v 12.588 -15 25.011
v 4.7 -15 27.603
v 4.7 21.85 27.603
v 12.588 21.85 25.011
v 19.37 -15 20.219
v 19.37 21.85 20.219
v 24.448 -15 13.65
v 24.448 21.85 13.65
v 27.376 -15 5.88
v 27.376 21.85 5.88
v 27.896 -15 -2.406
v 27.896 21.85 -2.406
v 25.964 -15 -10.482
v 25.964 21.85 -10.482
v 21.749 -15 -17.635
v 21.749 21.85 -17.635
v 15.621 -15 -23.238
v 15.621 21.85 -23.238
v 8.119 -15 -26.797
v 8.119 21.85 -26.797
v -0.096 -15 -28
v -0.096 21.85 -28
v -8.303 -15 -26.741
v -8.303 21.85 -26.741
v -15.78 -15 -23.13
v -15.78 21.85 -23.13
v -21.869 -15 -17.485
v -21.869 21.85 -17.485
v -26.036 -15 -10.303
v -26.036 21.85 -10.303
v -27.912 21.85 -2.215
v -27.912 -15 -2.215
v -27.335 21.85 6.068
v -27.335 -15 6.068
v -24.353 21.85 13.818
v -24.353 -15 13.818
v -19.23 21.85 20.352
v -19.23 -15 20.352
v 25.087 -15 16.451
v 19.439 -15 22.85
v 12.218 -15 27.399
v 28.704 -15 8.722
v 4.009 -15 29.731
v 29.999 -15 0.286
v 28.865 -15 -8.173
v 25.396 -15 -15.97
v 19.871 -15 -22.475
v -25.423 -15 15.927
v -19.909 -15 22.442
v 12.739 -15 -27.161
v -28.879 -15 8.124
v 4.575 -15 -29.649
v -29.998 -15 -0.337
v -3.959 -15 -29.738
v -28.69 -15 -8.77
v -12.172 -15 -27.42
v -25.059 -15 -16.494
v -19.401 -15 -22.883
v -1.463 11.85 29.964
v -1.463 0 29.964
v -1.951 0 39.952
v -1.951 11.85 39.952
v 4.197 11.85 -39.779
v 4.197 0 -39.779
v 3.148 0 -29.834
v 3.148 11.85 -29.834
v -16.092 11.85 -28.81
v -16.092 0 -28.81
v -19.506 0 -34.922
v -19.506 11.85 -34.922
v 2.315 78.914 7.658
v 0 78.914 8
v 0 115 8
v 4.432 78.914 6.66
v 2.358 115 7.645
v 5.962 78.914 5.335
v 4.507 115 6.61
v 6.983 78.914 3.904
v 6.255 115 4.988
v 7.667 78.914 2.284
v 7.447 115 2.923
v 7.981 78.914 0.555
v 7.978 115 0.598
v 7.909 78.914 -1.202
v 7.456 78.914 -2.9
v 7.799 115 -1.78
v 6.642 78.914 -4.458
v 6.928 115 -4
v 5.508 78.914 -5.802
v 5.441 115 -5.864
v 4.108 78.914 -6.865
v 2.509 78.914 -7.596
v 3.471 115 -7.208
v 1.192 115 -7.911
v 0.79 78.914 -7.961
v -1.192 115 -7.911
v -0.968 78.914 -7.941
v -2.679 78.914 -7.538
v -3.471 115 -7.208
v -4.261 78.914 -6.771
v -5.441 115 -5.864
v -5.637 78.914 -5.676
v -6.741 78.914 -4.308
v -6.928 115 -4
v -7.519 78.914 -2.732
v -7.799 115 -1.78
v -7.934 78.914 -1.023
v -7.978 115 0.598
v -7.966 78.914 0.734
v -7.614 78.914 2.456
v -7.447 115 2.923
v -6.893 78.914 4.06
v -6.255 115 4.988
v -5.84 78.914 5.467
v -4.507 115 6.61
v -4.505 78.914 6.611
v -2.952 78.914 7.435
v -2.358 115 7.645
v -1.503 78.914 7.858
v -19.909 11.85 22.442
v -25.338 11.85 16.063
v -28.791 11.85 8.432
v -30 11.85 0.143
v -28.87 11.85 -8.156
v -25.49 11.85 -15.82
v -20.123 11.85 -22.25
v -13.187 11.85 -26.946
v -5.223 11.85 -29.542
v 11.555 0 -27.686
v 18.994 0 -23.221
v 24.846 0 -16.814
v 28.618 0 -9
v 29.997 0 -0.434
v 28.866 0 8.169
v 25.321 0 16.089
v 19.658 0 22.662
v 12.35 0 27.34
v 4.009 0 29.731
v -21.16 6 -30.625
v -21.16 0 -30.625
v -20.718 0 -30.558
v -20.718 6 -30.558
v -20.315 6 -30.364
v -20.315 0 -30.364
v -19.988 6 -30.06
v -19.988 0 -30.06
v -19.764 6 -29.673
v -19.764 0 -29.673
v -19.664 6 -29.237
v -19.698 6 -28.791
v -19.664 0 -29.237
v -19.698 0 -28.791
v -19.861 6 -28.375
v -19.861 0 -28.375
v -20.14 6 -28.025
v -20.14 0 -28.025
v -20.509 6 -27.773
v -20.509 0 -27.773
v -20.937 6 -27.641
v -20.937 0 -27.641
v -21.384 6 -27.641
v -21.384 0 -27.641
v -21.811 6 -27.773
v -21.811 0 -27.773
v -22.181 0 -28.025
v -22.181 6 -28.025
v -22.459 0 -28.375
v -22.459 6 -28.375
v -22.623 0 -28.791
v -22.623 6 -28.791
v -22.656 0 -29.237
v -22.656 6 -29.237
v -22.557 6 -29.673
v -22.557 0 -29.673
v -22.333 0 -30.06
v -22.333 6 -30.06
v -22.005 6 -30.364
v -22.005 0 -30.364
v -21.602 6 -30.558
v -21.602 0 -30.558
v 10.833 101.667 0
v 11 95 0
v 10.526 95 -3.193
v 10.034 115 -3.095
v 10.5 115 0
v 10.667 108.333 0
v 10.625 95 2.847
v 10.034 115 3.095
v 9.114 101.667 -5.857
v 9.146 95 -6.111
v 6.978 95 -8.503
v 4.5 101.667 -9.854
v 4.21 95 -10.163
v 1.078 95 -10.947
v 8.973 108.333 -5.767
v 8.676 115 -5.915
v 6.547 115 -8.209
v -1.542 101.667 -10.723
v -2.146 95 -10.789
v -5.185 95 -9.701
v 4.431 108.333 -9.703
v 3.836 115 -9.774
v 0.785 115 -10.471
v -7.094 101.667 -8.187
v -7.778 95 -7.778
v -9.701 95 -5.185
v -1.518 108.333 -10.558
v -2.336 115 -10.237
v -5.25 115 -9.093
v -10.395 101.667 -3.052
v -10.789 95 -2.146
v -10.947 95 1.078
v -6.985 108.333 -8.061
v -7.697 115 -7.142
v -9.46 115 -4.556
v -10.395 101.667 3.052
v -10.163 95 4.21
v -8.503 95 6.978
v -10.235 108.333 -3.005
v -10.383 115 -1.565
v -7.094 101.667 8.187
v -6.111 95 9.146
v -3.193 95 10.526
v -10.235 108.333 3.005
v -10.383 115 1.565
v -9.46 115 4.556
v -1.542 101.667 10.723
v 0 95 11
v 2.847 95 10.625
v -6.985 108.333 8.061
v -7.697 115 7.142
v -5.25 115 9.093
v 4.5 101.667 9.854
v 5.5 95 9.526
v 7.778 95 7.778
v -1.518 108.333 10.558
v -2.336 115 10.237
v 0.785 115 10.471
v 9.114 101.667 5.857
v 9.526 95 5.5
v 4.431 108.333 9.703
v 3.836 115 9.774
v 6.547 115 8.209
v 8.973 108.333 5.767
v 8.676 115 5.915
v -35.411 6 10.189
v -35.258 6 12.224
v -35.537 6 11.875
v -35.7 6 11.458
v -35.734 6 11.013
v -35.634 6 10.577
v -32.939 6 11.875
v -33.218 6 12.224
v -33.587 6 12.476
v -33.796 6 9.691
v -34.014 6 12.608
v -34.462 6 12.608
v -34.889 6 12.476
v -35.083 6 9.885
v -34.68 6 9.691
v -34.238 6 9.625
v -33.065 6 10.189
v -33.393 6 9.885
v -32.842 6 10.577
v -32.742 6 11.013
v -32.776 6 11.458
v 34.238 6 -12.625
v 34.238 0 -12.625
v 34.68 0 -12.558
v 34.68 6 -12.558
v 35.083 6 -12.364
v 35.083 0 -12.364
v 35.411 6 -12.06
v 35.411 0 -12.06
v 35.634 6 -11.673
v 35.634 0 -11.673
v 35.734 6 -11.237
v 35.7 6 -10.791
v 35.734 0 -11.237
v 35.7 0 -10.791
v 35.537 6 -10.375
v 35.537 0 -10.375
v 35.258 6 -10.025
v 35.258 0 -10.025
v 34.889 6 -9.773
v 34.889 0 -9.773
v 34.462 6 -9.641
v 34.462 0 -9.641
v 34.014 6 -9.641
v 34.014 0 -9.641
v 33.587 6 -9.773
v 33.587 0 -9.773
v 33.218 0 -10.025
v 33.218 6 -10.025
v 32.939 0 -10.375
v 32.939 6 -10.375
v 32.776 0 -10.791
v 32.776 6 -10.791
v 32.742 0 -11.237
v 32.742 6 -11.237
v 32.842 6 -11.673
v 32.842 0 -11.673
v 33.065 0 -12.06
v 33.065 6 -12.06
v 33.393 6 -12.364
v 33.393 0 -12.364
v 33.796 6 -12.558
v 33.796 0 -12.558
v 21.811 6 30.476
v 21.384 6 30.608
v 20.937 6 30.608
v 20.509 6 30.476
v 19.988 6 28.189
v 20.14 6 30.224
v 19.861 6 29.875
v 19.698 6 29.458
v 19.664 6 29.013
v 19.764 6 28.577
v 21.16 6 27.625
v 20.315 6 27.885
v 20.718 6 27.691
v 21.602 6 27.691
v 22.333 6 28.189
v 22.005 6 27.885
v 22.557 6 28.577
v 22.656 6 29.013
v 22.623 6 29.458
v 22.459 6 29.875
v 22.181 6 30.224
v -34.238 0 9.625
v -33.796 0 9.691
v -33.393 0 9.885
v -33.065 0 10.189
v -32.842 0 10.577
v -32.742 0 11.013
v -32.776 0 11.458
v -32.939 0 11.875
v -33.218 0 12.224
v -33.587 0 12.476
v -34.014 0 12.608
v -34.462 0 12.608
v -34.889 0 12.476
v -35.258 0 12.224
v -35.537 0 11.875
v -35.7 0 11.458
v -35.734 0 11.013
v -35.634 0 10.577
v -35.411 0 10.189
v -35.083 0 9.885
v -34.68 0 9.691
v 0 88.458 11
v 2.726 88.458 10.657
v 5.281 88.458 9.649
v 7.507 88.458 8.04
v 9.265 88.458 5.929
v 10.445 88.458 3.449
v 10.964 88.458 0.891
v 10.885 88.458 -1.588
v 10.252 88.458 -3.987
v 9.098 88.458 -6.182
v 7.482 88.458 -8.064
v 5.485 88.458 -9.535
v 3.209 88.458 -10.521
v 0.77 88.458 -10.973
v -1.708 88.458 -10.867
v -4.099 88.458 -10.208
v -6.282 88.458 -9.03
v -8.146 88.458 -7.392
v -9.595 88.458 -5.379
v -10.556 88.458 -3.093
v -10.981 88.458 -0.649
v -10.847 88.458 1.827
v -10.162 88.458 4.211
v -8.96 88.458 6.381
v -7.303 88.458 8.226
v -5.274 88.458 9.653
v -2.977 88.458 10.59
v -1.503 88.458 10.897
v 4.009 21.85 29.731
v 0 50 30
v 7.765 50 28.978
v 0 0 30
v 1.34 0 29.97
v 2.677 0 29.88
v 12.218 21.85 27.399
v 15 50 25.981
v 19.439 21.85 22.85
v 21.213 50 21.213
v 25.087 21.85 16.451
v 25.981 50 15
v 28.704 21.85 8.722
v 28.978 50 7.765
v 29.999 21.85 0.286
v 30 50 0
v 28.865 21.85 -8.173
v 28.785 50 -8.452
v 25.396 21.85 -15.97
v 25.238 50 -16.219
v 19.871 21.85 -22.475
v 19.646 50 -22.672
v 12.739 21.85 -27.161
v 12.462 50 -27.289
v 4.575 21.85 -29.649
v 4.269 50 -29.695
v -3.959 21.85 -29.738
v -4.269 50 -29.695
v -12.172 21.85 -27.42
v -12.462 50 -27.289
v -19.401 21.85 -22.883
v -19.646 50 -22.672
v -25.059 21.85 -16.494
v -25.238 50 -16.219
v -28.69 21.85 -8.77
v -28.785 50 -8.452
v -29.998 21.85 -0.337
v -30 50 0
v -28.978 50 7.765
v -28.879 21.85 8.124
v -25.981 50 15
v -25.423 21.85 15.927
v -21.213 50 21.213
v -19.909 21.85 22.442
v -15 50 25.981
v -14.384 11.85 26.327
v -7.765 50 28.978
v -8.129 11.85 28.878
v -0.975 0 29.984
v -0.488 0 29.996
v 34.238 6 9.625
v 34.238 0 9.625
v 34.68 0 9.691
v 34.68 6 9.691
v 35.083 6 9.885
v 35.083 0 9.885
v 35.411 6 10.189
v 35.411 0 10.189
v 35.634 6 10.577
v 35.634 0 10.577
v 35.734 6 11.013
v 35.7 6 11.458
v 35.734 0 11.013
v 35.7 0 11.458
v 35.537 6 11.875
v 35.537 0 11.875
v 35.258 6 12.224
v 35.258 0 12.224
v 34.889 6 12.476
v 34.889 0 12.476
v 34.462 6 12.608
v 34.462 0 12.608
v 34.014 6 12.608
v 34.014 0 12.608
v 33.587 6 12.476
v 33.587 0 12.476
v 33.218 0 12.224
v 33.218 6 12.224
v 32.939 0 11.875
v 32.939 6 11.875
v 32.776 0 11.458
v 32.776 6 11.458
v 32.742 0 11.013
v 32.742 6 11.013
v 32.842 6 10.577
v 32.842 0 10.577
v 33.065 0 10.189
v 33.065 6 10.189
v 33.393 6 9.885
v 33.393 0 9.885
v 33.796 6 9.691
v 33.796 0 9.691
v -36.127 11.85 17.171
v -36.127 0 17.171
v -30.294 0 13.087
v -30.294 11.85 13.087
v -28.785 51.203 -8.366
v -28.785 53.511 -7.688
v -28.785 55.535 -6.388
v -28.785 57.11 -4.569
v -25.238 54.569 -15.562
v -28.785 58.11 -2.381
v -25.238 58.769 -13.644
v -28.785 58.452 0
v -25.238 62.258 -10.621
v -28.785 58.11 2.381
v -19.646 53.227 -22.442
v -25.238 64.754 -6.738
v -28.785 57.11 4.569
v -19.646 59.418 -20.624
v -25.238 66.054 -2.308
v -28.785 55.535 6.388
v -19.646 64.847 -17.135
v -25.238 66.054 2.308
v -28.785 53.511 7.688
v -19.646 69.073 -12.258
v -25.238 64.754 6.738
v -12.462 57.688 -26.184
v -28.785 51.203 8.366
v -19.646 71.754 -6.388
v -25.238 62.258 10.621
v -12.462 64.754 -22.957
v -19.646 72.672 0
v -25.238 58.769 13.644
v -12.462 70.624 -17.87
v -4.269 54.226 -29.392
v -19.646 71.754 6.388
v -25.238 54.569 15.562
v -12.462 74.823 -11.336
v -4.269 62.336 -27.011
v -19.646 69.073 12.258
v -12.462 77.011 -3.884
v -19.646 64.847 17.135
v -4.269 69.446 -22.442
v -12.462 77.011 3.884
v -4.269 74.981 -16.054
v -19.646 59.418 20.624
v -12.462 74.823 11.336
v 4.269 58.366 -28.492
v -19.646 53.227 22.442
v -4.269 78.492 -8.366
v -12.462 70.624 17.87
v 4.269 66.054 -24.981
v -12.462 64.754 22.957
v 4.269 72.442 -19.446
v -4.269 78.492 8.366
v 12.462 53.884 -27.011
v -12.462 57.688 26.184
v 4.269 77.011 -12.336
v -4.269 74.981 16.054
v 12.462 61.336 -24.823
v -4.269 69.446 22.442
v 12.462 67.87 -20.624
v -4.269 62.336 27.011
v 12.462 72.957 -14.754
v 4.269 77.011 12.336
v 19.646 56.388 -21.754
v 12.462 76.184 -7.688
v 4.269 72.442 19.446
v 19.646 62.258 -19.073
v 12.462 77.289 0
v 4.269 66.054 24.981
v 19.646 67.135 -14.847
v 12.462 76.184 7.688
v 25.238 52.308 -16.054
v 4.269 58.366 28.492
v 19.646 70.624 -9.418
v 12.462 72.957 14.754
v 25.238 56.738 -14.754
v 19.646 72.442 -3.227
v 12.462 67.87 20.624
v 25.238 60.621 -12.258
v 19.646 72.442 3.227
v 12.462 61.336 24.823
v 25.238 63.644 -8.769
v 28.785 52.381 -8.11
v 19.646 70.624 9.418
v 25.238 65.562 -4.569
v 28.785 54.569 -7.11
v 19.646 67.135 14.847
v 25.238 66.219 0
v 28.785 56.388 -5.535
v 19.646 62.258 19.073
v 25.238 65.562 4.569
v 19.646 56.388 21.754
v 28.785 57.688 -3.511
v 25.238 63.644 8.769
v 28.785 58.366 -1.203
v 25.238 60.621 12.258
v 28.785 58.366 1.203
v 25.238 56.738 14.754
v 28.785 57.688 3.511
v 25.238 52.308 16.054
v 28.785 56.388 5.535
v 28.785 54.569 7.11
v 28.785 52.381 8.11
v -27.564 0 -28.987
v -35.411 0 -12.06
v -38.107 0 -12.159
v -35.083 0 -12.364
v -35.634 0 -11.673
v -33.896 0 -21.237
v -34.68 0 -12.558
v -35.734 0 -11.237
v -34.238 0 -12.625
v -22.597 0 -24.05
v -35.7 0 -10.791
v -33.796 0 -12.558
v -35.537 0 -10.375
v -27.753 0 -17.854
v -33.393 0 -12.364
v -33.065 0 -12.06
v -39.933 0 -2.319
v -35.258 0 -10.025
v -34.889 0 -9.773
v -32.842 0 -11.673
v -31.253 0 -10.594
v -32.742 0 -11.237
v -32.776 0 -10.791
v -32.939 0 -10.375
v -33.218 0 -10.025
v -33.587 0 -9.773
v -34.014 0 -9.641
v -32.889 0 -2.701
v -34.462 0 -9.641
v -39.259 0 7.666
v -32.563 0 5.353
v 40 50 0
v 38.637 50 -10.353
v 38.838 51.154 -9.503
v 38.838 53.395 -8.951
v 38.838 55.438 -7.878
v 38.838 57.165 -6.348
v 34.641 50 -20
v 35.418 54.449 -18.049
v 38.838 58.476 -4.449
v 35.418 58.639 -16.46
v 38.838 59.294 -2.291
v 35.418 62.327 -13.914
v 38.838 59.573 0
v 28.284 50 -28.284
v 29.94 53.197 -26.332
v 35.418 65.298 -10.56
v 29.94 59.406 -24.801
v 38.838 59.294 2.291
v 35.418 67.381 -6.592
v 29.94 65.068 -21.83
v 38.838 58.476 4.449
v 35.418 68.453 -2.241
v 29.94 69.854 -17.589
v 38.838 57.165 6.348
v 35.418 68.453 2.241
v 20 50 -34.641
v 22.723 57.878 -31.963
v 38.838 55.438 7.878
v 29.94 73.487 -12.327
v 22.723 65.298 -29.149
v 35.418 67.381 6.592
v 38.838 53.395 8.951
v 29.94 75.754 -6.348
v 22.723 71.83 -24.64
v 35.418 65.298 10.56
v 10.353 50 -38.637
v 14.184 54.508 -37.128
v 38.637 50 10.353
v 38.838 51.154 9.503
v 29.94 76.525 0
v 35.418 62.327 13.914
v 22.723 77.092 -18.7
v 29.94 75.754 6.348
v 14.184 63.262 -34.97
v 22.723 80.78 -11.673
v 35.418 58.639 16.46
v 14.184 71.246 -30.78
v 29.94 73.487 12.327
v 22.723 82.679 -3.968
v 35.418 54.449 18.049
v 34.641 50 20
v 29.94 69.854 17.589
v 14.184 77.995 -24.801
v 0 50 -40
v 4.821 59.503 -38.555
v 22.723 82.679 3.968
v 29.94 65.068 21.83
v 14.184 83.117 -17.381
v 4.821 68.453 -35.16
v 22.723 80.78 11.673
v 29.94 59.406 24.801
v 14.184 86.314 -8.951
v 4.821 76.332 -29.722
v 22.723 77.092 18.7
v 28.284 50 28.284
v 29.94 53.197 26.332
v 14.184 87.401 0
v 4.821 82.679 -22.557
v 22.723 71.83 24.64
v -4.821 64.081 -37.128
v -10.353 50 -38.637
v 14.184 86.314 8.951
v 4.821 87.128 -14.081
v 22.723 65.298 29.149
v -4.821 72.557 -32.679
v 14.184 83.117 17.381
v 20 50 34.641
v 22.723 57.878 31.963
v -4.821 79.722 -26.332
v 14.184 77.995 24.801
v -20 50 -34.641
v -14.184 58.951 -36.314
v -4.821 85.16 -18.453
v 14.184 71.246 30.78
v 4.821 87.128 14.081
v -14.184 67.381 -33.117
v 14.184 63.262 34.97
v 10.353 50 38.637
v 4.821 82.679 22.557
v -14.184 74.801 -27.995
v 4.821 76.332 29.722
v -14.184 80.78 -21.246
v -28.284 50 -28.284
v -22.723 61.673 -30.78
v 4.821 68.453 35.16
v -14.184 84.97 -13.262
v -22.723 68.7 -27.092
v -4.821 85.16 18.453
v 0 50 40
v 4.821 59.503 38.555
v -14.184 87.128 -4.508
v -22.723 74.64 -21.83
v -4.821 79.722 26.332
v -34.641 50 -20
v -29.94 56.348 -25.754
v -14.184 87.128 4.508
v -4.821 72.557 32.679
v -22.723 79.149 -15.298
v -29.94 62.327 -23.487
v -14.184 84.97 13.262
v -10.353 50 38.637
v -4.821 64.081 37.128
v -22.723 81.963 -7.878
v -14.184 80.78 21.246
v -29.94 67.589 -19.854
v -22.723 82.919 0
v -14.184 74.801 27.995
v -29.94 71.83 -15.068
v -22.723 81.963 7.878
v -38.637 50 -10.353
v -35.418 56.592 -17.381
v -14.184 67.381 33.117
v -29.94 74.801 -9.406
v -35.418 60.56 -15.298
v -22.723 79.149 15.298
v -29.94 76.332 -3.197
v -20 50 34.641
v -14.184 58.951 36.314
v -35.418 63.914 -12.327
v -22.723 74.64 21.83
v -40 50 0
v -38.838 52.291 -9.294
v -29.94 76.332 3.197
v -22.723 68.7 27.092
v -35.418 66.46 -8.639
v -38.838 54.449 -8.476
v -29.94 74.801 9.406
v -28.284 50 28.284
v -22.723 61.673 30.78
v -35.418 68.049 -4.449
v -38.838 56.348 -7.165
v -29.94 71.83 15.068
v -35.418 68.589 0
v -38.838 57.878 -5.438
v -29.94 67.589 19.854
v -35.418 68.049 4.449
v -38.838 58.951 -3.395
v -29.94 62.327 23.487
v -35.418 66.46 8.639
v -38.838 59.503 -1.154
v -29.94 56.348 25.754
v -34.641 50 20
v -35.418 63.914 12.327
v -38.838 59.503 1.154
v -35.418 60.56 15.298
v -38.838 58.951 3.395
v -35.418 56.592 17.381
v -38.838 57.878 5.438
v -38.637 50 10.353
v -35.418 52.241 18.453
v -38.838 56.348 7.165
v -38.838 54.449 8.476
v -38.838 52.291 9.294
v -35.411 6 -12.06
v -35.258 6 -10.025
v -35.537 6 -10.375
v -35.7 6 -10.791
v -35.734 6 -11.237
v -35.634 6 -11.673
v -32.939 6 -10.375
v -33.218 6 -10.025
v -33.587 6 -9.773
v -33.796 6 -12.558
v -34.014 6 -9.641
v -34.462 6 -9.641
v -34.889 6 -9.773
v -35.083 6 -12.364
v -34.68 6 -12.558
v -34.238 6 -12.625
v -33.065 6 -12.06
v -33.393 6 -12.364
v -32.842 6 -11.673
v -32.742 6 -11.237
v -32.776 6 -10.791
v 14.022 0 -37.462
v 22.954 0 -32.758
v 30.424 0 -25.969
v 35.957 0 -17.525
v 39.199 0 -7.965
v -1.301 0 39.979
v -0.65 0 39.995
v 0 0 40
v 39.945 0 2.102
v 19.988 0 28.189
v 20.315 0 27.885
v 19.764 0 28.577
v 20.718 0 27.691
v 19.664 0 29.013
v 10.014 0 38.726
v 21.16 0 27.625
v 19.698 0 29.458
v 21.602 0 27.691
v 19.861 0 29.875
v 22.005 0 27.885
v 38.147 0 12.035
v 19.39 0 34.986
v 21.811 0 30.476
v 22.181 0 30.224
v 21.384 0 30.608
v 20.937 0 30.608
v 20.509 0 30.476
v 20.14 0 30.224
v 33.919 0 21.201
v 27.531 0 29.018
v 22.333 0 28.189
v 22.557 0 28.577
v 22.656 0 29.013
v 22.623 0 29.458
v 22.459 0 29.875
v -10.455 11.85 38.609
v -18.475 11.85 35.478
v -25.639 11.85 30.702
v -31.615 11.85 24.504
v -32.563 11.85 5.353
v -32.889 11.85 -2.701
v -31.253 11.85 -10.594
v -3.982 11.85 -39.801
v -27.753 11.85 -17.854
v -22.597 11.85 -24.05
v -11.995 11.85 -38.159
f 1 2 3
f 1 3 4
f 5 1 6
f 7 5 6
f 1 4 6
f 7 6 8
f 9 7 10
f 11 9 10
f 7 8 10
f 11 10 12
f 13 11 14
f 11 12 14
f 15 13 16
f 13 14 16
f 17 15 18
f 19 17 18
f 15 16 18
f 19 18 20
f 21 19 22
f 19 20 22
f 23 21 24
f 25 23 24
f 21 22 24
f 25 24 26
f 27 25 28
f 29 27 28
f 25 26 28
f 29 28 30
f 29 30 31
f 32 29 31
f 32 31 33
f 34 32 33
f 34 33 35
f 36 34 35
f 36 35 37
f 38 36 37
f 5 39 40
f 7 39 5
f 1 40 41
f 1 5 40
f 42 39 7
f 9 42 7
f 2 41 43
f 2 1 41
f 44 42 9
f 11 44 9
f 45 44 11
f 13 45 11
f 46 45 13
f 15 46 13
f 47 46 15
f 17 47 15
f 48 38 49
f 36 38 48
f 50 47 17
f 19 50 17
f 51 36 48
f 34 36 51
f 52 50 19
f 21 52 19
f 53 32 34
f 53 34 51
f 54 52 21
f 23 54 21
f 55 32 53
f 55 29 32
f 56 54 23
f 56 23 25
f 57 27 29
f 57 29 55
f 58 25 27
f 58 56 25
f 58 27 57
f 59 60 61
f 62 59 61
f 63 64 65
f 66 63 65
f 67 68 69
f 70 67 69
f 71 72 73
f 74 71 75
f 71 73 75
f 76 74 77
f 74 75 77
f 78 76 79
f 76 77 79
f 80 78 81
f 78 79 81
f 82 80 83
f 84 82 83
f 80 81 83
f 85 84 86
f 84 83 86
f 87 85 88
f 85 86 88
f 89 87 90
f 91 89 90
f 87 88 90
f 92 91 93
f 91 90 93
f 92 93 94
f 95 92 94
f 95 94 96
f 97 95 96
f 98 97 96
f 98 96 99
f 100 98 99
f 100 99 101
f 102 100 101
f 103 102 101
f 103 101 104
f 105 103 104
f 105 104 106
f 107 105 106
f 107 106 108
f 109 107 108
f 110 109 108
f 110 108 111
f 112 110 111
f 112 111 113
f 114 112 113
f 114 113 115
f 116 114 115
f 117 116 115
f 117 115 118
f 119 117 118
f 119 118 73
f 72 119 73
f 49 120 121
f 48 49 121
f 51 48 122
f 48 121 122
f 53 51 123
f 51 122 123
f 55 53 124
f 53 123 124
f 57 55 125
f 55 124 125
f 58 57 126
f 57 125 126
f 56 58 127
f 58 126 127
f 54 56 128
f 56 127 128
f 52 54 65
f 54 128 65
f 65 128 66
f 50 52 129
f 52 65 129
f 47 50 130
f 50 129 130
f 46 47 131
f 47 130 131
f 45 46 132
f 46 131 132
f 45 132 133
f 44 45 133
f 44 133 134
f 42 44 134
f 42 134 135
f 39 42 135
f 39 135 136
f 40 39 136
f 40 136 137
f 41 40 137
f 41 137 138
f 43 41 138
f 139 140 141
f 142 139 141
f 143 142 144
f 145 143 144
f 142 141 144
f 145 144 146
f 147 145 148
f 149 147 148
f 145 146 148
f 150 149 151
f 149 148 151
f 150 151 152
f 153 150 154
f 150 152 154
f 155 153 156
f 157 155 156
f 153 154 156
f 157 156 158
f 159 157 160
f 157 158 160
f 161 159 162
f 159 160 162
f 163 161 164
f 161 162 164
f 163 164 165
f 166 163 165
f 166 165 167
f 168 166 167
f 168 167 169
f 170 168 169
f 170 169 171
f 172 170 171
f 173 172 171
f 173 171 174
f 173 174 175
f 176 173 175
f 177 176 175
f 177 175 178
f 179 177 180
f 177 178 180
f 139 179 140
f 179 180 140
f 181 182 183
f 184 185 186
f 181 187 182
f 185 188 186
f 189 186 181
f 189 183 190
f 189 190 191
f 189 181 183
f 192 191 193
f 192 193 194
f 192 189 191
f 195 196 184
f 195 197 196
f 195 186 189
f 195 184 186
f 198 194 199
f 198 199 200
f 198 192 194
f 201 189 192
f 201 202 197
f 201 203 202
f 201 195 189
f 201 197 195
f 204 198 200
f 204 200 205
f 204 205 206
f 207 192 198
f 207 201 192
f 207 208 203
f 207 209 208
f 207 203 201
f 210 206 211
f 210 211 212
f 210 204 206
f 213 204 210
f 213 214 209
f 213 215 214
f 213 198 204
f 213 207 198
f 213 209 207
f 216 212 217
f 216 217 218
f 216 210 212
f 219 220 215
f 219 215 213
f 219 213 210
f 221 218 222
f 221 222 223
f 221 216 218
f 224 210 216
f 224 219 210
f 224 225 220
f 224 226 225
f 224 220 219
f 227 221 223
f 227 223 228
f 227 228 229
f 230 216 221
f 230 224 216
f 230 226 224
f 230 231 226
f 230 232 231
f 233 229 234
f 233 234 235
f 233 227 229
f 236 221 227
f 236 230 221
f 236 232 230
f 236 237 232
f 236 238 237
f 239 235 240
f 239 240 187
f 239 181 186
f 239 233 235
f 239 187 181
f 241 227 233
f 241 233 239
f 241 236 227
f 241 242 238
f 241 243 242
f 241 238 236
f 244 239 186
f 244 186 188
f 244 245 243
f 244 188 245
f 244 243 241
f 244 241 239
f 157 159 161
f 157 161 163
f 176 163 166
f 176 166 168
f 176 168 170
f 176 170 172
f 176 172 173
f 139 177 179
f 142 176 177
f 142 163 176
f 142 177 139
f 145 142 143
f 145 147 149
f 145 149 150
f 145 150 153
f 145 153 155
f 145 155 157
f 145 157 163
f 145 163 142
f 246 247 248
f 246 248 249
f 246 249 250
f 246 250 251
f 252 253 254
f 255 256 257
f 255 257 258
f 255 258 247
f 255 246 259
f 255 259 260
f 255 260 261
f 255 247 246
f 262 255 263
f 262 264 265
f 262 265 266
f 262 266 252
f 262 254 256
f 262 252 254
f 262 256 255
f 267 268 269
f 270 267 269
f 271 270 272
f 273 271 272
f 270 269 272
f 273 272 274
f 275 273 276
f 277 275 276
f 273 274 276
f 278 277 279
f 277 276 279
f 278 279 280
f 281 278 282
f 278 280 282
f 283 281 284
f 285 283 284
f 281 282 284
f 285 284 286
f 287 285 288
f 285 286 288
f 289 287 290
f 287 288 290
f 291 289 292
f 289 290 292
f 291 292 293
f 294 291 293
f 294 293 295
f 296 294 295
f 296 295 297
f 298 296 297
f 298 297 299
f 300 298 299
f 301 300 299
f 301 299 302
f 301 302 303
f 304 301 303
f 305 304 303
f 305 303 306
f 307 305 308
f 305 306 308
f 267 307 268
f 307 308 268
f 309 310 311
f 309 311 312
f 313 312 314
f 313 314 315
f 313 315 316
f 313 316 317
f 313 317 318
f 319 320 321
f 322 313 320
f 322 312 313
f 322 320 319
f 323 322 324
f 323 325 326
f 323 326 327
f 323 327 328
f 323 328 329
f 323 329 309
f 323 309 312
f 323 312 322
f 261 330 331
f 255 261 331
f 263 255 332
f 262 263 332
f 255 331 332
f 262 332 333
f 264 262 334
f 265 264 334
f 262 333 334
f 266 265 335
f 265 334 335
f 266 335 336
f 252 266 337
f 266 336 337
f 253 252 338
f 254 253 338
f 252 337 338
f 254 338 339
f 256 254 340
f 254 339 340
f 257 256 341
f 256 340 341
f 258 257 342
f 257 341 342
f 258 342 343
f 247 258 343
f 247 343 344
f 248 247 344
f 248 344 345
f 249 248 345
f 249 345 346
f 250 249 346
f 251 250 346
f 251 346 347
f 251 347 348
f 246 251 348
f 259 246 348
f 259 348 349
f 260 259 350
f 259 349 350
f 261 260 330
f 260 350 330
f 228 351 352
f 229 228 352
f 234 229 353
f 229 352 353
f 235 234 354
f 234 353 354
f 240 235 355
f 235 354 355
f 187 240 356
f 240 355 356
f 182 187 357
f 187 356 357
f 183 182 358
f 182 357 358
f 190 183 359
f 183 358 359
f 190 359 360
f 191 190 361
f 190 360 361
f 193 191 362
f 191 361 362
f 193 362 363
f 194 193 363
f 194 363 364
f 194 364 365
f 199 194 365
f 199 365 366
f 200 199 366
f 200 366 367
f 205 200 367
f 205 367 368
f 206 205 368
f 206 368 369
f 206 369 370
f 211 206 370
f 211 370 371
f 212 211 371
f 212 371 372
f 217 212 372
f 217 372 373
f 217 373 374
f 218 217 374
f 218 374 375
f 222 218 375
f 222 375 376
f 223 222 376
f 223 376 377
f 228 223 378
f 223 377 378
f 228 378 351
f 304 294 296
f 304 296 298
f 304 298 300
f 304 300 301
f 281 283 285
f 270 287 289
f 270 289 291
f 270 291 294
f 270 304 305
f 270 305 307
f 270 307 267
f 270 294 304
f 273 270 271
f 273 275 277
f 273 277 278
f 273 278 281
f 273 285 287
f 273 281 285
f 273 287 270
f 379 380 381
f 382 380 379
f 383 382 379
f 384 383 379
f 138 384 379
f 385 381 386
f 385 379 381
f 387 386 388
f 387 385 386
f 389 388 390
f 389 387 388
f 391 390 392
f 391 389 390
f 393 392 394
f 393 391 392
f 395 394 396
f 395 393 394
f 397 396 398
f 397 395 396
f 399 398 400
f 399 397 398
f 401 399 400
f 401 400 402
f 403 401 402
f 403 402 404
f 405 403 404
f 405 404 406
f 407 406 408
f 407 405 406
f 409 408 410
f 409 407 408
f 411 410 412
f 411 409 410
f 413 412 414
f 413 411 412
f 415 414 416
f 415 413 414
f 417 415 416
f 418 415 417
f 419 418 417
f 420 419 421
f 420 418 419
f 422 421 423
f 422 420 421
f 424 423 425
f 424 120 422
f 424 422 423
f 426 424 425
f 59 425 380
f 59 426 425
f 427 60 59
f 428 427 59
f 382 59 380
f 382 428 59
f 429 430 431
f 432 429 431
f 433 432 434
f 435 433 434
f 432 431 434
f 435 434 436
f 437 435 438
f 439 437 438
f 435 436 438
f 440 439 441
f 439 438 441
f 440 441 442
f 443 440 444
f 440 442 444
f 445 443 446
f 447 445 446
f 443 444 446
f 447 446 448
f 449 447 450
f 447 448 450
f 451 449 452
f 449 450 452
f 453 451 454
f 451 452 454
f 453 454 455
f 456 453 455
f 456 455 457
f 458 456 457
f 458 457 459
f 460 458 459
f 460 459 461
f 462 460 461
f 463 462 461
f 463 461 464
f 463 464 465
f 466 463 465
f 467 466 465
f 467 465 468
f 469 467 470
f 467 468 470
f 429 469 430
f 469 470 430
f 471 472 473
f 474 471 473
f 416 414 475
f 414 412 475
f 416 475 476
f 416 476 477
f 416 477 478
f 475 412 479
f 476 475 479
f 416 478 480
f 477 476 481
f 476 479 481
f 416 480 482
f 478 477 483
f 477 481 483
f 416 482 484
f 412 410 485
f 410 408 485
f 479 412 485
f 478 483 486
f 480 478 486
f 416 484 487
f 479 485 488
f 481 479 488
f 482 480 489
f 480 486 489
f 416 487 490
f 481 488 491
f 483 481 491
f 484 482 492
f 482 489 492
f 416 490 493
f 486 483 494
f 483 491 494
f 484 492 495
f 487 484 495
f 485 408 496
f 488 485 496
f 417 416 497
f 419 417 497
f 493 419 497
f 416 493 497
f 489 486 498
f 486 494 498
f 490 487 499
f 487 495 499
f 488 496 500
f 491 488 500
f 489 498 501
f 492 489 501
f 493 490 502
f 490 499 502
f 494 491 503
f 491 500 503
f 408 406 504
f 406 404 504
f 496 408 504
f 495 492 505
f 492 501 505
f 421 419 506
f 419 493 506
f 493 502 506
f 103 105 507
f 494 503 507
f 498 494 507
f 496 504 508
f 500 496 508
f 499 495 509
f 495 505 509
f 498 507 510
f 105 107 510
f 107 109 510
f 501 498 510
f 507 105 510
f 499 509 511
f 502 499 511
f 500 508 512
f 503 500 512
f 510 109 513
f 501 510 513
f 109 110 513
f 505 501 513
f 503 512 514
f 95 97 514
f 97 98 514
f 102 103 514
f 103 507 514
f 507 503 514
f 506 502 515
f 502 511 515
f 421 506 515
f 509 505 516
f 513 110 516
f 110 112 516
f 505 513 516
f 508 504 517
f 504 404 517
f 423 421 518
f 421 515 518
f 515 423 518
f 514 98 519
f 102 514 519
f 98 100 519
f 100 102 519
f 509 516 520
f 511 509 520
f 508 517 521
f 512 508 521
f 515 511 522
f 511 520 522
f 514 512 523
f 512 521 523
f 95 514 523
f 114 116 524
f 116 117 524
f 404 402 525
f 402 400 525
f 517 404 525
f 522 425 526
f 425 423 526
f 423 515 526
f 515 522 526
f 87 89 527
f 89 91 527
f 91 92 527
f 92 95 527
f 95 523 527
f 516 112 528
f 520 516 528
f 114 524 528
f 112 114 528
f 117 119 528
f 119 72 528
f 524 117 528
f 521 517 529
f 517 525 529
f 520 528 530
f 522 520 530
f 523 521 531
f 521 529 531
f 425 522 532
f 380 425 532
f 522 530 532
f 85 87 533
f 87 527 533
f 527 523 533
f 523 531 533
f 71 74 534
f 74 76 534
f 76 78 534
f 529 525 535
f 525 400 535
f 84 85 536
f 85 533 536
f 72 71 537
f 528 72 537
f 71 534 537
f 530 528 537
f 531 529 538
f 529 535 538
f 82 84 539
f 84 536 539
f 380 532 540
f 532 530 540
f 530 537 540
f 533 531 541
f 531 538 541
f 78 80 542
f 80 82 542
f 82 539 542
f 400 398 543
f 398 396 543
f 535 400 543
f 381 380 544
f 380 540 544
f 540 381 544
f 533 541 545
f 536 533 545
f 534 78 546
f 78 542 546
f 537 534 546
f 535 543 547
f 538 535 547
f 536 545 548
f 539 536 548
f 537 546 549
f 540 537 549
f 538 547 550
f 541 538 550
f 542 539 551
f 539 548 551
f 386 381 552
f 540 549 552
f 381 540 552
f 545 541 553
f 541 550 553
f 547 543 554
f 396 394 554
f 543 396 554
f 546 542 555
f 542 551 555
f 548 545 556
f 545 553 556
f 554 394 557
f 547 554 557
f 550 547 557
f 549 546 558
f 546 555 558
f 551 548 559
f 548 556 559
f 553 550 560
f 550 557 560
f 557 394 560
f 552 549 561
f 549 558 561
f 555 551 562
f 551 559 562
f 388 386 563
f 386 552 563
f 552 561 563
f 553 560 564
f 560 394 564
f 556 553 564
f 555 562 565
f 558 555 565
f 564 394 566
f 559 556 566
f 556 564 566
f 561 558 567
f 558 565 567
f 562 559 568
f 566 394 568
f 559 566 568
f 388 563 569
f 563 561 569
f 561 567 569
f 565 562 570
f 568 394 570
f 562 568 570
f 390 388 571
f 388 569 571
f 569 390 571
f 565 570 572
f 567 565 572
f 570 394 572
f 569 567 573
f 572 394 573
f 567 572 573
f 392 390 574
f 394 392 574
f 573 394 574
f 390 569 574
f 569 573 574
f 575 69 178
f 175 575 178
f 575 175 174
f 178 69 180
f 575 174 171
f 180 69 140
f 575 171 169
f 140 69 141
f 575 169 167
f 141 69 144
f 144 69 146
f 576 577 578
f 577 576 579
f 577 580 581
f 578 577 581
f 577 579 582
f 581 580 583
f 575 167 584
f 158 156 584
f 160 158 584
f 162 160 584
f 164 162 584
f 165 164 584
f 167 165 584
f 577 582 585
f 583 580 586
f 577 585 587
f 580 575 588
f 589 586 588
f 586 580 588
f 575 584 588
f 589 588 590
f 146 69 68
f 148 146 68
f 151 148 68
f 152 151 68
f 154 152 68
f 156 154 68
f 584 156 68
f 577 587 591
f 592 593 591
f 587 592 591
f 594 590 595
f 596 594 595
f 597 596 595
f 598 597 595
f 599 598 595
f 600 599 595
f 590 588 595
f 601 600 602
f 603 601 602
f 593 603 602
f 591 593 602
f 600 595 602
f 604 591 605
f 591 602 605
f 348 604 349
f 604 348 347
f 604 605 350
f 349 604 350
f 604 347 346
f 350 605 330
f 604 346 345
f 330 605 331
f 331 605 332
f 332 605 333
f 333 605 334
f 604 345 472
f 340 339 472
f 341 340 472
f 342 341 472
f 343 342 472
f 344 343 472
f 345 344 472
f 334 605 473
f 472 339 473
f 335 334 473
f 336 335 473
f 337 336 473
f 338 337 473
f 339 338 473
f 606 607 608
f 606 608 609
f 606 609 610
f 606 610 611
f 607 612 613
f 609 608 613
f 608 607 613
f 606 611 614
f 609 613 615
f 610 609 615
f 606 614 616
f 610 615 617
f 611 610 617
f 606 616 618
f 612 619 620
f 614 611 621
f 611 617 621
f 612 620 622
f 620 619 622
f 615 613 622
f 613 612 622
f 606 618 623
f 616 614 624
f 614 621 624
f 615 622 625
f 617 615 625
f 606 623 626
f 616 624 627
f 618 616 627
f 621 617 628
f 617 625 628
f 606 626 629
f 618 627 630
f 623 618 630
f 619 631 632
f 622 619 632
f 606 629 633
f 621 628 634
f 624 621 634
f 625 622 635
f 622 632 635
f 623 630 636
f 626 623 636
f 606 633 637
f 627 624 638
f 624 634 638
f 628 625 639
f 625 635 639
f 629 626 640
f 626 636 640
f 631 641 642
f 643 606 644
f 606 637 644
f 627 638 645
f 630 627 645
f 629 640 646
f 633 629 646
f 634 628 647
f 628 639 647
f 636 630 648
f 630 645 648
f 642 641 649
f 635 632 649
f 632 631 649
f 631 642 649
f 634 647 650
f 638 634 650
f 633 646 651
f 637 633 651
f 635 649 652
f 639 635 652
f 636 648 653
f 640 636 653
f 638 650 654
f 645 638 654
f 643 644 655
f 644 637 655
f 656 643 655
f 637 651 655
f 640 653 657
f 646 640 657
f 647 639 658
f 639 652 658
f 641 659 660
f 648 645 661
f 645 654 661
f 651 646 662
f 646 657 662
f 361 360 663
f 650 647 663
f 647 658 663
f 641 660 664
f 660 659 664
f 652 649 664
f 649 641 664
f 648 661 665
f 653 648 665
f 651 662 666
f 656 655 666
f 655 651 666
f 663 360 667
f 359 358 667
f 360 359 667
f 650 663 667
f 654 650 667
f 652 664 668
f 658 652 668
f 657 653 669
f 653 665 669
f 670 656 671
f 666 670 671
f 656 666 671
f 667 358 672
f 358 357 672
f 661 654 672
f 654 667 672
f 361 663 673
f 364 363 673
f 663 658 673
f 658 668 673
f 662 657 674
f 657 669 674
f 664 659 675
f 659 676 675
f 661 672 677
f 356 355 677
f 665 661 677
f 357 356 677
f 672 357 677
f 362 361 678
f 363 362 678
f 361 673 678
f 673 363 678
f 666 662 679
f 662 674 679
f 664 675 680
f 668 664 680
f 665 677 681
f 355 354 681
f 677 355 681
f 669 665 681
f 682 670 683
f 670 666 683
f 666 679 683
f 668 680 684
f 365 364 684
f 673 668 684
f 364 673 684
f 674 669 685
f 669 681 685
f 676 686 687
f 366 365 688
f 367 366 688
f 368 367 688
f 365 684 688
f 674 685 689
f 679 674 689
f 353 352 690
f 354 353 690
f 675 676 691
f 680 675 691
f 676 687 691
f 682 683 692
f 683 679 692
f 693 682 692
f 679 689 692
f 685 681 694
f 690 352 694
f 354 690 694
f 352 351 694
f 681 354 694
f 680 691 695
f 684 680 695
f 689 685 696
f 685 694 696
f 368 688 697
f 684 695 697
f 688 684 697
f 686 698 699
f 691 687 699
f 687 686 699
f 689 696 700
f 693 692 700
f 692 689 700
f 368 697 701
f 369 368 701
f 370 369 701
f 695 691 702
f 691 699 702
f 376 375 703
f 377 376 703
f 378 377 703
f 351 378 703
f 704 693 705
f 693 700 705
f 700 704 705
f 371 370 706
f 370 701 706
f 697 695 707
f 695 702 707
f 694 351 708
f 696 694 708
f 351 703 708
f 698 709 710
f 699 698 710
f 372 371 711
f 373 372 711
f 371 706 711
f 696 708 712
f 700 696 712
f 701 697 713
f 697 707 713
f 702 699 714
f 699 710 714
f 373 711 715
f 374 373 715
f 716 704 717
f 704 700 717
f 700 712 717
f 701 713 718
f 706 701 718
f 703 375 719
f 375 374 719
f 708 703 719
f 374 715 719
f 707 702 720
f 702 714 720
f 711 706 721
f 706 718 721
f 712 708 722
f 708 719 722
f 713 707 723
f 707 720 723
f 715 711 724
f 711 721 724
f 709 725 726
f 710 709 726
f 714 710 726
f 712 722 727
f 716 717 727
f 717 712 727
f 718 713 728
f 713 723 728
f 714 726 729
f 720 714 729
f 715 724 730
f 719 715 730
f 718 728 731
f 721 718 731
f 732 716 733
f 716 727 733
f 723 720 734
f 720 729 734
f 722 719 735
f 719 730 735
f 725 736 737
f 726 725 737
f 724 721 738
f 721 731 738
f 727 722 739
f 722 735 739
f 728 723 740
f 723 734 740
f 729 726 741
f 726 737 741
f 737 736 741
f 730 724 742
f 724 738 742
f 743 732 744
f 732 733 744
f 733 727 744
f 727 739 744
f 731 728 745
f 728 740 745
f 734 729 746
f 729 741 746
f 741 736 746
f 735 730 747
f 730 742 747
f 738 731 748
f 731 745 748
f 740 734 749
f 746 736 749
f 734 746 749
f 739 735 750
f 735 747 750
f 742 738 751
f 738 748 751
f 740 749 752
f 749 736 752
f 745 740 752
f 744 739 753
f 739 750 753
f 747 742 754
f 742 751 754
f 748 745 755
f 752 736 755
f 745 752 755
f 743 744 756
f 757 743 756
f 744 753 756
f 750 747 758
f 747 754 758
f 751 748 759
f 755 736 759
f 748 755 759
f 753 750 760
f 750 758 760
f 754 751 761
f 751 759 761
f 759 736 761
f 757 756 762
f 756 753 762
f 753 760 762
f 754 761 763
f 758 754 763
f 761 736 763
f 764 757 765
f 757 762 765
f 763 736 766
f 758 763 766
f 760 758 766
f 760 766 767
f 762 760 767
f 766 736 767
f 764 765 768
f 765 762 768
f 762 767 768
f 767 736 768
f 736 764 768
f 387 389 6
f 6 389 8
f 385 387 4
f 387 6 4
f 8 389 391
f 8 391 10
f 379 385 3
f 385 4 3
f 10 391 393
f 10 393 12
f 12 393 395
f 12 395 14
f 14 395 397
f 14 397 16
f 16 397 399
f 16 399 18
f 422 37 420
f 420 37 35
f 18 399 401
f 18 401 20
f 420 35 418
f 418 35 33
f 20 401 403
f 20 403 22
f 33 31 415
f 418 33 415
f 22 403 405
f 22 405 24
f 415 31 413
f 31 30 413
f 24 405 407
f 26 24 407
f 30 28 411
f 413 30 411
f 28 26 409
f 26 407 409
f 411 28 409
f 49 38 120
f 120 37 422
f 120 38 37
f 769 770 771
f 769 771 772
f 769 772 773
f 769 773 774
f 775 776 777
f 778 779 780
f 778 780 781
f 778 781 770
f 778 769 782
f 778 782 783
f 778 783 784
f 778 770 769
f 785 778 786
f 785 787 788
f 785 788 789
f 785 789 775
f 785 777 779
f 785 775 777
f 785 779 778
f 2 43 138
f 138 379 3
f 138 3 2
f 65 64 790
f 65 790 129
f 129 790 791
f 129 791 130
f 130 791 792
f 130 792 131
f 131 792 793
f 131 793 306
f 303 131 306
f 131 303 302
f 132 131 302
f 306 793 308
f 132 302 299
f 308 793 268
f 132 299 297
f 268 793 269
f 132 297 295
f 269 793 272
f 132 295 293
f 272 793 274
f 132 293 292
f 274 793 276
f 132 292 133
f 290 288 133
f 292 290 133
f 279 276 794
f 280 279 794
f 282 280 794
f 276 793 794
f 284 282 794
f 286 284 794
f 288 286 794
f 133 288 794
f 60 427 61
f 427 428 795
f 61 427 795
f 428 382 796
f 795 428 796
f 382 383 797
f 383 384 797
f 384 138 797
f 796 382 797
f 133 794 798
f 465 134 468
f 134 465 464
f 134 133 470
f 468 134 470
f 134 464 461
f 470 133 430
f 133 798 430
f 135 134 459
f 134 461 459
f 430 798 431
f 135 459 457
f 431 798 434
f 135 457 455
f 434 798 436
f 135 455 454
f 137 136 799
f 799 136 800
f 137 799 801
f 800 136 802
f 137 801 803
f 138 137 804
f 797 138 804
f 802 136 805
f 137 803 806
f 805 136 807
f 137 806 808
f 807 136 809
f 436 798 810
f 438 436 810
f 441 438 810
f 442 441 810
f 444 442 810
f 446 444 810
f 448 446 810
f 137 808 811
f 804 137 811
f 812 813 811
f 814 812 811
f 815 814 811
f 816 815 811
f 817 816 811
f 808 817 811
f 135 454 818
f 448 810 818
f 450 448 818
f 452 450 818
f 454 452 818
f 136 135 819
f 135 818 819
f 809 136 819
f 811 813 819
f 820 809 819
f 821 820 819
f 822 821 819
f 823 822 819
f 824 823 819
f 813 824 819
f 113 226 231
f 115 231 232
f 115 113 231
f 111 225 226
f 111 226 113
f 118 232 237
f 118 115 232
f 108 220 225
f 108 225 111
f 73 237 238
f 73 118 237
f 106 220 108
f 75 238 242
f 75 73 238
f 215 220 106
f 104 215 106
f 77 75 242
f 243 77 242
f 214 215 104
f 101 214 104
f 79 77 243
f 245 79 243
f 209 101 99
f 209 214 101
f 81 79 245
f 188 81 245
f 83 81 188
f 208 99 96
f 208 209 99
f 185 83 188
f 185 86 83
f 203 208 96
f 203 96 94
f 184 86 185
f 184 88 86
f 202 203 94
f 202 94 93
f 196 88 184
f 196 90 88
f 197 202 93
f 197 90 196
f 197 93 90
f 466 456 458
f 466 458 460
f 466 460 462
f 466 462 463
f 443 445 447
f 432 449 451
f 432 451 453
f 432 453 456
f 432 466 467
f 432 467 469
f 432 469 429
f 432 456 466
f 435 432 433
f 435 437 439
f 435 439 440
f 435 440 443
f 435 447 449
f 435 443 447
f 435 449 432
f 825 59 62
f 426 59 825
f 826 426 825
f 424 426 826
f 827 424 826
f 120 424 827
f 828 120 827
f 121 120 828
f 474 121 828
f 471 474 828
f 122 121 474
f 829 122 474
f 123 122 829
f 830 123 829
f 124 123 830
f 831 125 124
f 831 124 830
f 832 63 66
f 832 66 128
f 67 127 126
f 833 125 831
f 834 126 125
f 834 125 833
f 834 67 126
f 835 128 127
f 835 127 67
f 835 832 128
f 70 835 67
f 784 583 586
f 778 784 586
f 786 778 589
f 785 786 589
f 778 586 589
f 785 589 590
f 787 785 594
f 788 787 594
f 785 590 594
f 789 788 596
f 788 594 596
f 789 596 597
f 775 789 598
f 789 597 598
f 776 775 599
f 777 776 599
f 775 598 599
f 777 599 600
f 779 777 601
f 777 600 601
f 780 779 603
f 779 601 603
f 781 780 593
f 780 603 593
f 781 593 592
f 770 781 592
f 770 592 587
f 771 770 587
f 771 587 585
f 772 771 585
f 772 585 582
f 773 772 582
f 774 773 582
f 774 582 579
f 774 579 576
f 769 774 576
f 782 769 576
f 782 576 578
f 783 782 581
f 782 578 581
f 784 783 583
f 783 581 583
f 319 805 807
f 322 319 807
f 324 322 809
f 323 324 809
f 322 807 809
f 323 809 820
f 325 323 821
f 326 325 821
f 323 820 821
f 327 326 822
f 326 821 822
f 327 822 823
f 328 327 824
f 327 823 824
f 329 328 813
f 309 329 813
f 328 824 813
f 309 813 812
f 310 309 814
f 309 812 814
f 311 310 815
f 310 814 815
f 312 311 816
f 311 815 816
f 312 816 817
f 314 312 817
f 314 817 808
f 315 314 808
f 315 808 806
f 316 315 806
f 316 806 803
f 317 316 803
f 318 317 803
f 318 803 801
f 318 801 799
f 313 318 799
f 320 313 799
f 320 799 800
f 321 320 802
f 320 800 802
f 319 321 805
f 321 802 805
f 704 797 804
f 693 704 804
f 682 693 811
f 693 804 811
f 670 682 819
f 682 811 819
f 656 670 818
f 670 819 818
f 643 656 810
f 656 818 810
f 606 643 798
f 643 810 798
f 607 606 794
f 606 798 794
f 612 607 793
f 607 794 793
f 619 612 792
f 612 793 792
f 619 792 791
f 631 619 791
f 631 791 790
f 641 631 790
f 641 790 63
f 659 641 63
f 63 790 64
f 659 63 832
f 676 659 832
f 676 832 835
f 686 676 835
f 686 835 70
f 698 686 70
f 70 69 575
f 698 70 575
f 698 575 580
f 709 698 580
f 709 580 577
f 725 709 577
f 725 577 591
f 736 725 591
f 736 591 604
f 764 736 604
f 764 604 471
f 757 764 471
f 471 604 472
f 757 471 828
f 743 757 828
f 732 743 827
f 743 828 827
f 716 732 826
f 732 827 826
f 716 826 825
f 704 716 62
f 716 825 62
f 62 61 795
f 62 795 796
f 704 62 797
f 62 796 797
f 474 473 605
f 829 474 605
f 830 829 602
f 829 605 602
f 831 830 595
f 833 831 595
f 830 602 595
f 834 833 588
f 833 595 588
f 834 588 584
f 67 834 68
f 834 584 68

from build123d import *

# Parameters (mm, degrees)
ESBO_O1_R                     = 40
ESBO_O1_R_2                   = 30
RESSALTO_EXTRUS_O1_DEPTH      = 50
ESBO_O2_R                     = 1.5
CORTE_EXTRUS_O1_DEPTH         = 6
CORTE_EXTRUS_O2_DEPTH         = 11.84997677
RESSALTO_EXTRUS_O2_DEPTH      = 26.84997677
RESSALTO_EXTRUS_O2_DEPTH_BACK = 10
REVOLU_O1_ANGLE               = 180
RESSALTO_EXTRUS_O5_DEPTH      = 5
RESSALTO_EXTRUS_O5_DEPTH_BACK = 2
ESBO_O10_R                    = 11
ESBO_O13_R                    = 8
CORTE_EXTRUS_O4_DEPTH         = 40


# Read off the part's stored shape, not the designer's step: Limites1
with BuildPart() as part:
    # Esboço1 → Ressalto-extrusão1 (new body)
    with BuildSketch(Plane(origin=(0, 0, 0), x_dir=(1, 0, 0), z_dir=(0, 1, 0))):
        with Locations(Location((0, 0, 0), (0, 0, 270))):
            Circle(ESBO_O1_R)
        with Locations(Location((0, 0, 0), (0, 0, 270))):
            Circle(ESBO_O1_R_2, mode=Mode.SUBTRACT)
    extrude(amount=RESSALTO_EXTRUS_O1_DEPTH)

    # Esboço2 → Corte-extrusão1 (cut)
    with BuildSketch(Plane(origin=(0, 0, 0), x_dir=(-1, 0, 0), z_dir=(0, -1, 0))):
        with Locations(Location((-21.160269083, -29.124611797, 0), (0, 0, 90))):
            Circle(ESBO_O2_R)
        with Locations(Location((-34.238034587, -11.124611797, 0), (0, 0, 90))):
            Circle(ESBO_O2_R)
        with Locations(Location((-34.238034587, 11.124611797, 0), (0, 0, 90))):
            Circle(ESBO_O2_R)
        with Locations(Location((21.160269083, 29.124611797, 0), (0, 0, 90))):
            Circle(ESBO_O2_R)
        with Locations(Location((34.238034587, 11.124611797, 0), (0, 0, 90))):
            Circle(ESBO_O2_R)
        with Locations(Location((34.238034587, -11.124611797, 0), (0, 0, 90))):
            Circle(ESBO_O2_R)
    extrude(amount=-CORTE_EXTRUS_O1_DEPTH, mode=Mode.SUBTRACT)

    # Esboço3 → Corte-extrusão2 (cut)
    with BuildSketch(Plane(origin=(0, 0, 0), x_dir=(-1, 0, 0), z_dir=(0, -1, 0))):
        with BuildLine():
            ThreePointArc((30.293924668, -13.087327008), (31.253408489, 10.593604572), (16.092357529, 28.81034587))
            Line((16.092357529, 28.81034587), (19.505887914, 34.921631358))
            ThreePointArc((19.505887914, 34.921631358), (8.030354378, 39.185627576), (-4.197370073, 39.779166463))
            Line((-4.197370073, 39.779166463), (-3.148027555, 29.834374847))
            ThreePointArc((-3.148027555, 29.834374847), (29.911212101, 2.306380417), (1.462902849, -29.964310692))
            Line((1.462902849, -29.964310692), (1.950537132, -39.952414256))
            ThreePointArc((1.950537132, -39.952414256), (22.185986252, -33.283359416), (36.126859334, -17.171197823))
            Line((36.126859334, -17.171197823), (30.293924668, -13.087327008))
        make_face()
    extrude(amount=-CORTE_EXTRUS_O2_DEPTH, mode=Mode.SUBTRACT)

    # Esboço4 → Ressalto-extrusão2 (add, two sides: drawn at the far end of the back side and taken through both)
    with BuildSketch(Plane(origin=(0, 11.84997677, 0), x_dir=(-1, 0, 0), z_dir=(0, -1, 0)).offset(-RESSALTO_EXTRUS_O2_DEPTH_BACK)):
        with BuildLine():
            Line((-4.008838629, -29.730947056), (-4.700362463, -27.602655537))
            ThreePointArc((-4.700362463, -27.602655537), (-8.119302432, 26.79695744), (19.230258499, -20.351834268))
            Line((19.230258499, -20.351834268), (19.909240802, -22.441526924))
            ThreePointArc((19.909240802, -22.441526924), (-8.745833796, 28.696870757), (-4.008838629, -29.730947056))
        make_face()
    extrude(amount=RESSALTO_EXTRUS_O2_DEPTH + RESSALTO_EXTRUS_O2_DEPTH_BACK)

    # Esboço9 → Revolução1 (revolve)
    with BuildSketch(Plane(origin=(0, 50, 0), x_dir=(1, 0, 0), z_dir=(0, 1, 0))):
        with BuildLine():
            Line((-40, 0), (-30, 0))
            ThreePointArc((-30, 0), (0, 30), (30, 0))
            Line((30, 0), (40, 0))
            ThreePointArc((40, 0), (0, 40), (-40, 0))
        make_face()
    revolve(axis=Axis((-40, 50, 0), (1, 0, 0)), revolution_arc=REVOLU_O1_ANGLE)

    # Esboço10 → Ressalto-extrusão5 (add, two sides: drawn at the far end of the back side and taken through both)
    with BuildSketch(Plane(origin=(0, 90, 0), x_dir=(1, 0, 0), z_dir=(0, 1, 0)).offset(-RESSALTO_EXTRUS_O5_DEPTH_BACK)):
        with Locations(Location((0, 0, 0), (0, 0, 270))):
            Circle(ESBO_O10_R)
    extrude(amount=RESSALTO_EXTRUS_O5_DEPTH + RESSALTO_EXTRUS_O5_DEPTH_BACK)

    # Limites1 outline → Limites1 (revolve)
    with BuildSketch(Plane.XY):
        Polygon((11, 95), (10.5, 115), (0, 115), (0, 95), align=None)
    revolve(axis=Axis((0, 0, 0), (0, 1, 0)))

    # Esboço13 → Corte-extrusão4 (cut)
    with BuildSketch(Plane(origin=(0, 115, 0), x_dir=(1, 0, 0), z_dir=(0, 1, 0))):
        with Locations(Location((0, 0, 0), (0, 0, 270))):
            Circle(ESBO_O13_R)
    extrude(amount=-CORTE_EXTRUS_O4_DEPTH, mode=Mode.SUBTRACT)


solid = part.part
